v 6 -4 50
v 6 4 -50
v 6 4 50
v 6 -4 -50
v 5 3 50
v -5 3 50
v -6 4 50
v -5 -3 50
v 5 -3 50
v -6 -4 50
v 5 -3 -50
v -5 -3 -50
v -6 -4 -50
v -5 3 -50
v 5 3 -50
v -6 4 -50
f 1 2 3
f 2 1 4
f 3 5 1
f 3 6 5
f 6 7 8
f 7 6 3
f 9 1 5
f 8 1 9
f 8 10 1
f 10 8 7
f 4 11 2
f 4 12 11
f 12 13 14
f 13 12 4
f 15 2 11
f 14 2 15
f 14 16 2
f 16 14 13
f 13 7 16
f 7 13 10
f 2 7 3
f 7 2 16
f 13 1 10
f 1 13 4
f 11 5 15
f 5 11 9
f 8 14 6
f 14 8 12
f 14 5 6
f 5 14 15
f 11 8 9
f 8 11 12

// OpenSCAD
// Aluminium rectangular box section 12mm x 8mm x 1mm (open-ended tube)

// Parameters
outer_width_mm     = 12;   //[6:24:0.5]
outer_height_mm    = 8;    //[4:16:0.5]
wall_thickness_mm  = 1;    //[0.5:2:0.1]
length_mm          = 100;  //[20:400:1]
overlap_mm         = 0.8;  //[0.1:2:0.1]

// Derived (guard against invalid wall thickness)
inner_width_mm  = max(outer_width_mm  - 2*wall_thickness_mm, 0.01);
inner_height_mm = max(outer_height_mm - 2*wall_thickness_mm, 0.01);

module box_section_rect_tube() {
    // Ensure the inner cut is slightly longer so the tube is clearly open-ended
    inner_cut_len = length_mm + 2*overlap_mm;

    color("Silver")
    difference() {
        cube([outer_width_mm, outer_height_mm, length_mm], center=true);
        cube([inner_width_mm, inner_height_mm, inner_cut_len], center=true);
    }
}

box_section_rect_tube();
